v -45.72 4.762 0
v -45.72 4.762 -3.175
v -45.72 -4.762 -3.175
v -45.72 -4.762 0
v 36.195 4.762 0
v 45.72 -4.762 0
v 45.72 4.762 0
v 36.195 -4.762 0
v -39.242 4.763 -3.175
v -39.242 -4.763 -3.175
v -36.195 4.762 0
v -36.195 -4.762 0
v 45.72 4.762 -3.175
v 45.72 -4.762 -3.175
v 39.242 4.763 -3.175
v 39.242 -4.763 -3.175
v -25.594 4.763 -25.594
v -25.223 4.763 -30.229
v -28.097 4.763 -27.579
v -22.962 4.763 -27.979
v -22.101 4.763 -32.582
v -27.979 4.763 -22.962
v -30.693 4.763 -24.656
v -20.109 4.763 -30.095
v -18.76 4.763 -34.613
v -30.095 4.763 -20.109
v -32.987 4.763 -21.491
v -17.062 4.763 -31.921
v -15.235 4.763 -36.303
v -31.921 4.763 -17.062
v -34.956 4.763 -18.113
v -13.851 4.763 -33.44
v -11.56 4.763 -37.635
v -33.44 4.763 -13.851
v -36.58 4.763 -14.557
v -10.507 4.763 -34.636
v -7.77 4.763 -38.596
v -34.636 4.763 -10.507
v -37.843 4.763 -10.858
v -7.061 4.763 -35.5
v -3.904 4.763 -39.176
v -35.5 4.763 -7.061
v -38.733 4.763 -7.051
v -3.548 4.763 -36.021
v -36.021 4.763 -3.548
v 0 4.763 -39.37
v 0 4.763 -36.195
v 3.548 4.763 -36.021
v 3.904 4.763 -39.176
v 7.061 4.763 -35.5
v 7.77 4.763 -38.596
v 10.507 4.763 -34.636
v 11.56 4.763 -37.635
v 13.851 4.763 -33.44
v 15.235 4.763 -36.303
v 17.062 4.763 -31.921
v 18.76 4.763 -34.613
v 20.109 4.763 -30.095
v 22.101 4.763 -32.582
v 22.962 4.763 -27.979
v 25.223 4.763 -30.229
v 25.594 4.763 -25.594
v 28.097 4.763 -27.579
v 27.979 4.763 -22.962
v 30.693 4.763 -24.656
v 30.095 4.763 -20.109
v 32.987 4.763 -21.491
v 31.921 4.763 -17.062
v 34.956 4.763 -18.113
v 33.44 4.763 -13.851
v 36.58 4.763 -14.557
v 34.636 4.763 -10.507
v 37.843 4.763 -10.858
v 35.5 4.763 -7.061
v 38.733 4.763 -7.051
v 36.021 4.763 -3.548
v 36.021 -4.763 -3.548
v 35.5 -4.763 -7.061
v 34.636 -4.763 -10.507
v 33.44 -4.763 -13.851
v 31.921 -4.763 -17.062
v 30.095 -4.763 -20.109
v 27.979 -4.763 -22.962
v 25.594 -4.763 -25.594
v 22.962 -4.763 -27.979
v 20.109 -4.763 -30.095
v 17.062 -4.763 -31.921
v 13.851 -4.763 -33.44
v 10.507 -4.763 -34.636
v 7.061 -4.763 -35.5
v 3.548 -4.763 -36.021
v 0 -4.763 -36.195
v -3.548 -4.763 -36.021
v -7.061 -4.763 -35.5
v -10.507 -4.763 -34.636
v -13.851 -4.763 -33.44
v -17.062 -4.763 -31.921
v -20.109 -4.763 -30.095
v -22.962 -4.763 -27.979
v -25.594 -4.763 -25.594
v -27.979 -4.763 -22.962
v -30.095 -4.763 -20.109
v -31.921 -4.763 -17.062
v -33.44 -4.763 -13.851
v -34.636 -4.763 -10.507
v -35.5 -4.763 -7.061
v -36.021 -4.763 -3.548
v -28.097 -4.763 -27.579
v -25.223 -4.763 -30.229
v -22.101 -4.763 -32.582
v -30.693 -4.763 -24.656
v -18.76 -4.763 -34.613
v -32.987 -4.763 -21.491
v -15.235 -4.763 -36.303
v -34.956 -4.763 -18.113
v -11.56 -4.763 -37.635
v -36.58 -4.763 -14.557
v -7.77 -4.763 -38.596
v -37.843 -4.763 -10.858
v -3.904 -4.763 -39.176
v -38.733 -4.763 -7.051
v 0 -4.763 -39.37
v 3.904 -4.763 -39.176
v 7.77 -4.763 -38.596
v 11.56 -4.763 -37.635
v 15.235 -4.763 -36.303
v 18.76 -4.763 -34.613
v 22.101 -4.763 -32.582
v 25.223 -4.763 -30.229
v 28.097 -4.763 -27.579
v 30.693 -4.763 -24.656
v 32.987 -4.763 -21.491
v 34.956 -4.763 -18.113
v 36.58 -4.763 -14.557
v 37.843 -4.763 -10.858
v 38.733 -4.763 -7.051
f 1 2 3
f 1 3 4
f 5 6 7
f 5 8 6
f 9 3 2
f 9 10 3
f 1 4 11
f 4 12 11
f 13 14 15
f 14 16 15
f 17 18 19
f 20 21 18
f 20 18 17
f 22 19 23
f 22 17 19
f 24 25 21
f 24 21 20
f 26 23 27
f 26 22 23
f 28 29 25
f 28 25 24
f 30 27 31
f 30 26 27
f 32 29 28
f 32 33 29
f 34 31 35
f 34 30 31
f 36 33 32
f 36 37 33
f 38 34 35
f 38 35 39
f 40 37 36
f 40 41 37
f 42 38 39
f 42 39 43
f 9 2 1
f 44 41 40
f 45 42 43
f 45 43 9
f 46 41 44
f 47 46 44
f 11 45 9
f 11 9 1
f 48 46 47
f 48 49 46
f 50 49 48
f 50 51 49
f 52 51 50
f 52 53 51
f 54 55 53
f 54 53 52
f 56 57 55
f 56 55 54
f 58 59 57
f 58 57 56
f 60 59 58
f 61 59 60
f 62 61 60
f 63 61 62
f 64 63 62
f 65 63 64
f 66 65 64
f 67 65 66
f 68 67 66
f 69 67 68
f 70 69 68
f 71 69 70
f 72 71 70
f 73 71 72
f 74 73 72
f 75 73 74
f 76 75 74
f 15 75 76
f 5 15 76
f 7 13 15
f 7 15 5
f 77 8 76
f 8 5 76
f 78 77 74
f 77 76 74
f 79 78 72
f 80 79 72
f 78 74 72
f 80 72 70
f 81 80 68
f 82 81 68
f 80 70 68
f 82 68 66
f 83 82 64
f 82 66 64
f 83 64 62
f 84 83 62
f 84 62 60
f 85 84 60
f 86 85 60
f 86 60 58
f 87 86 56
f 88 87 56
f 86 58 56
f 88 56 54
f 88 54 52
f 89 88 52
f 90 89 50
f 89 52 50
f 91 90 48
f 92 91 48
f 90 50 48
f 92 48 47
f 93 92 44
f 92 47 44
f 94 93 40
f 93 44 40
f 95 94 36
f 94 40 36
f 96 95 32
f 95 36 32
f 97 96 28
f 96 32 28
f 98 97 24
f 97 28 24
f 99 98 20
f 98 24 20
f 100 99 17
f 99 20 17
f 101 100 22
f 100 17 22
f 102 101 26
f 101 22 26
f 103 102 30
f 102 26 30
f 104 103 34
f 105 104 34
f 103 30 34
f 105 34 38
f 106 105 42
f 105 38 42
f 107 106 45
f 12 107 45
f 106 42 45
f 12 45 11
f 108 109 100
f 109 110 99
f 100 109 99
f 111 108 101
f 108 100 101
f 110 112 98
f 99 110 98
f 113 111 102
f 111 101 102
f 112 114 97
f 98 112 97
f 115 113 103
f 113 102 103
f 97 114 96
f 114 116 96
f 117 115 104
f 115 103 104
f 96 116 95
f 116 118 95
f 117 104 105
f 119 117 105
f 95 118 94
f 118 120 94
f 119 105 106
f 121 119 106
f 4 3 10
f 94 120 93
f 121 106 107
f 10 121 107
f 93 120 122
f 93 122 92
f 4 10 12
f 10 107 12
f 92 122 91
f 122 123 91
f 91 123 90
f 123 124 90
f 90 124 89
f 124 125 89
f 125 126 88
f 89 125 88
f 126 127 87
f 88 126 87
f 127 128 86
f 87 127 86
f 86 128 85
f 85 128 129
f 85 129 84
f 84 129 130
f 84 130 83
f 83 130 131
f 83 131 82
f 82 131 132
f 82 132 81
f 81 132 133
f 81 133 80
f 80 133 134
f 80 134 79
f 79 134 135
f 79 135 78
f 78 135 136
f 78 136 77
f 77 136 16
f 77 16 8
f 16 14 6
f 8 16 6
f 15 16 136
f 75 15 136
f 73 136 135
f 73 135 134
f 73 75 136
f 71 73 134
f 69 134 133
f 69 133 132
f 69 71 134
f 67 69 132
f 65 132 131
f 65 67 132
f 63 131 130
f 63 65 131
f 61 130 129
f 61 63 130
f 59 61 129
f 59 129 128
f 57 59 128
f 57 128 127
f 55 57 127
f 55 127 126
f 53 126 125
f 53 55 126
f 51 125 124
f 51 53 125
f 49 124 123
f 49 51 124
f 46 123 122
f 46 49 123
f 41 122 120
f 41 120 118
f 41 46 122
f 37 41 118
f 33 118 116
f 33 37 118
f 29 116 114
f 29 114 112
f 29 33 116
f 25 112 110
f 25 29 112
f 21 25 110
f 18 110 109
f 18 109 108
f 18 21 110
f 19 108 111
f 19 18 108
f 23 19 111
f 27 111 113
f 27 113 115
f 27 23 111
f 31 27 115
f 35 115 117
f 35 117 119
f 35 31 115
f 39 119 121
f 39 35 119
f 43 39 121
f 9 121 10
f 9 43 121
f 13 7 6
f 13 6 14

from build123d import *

# Parameters (mm, degrees)
SKETCH1_W                = 3.175
SKETCH1_H                = 9.525
REVOLVE1_ANGLE           = 180
BOSS_EXTRUDE1_REACH      = 90.163
BOSS_EXTRUDE1_END_RADIUS = 39.37
SKETCH2_W                = 3.175
SKETCH2_H                = 9.525
SKETCH2_2_W              = 3.175
SKETCH2_2_H              = 9.525
BOSS_EXTRUDE2_DEPTH      = 6.35
BOSS_EXTRUDE3_REACH      = 95.878
BOSS_EXTRUDE3_END_RADIUS = 39.37
SKETCH4_W                = 3.175
SKETCH4_H                = 9.525
SKETCH4_2_W              = 3.175
SKETCH4_2_H              = 9.525
BOSS_EXTRUDE4_DEPTH      = 6.35


with BuildPart() as part:
    # Sketch1 → Revolve1 (revolve)
    with BuildSketch(Plane.XY):
        with Locations((37.7825, 0)):
            Rectangle(SKETCH1_W, SKETCH1_H)
    revolve(axis=Axis((0, -72.106361407, 0), (0, 1, 0)), revolution_arc=REVOLVE1_ANGLE)

    # Boss-Extrude1: up to this cylinder (the profile starts outside it)
    boss_extrude1_end = Plane(origin=(0, 0, 0), z_dir=(0, -1, 0)) * Cylinder(BOSS_EXTRUDE1_END_RADIUS, 260.066, mode=Mode.PRIVATE)
    # Sketch2 → Boss-Extrude1 (add, up to the surface)
    with BuildSketch(Plane(origin=(39.37, 0, 0), x_dir=(0, 0, -1), z_dir=(1, 0, 0)), mode=Mode.PRIVATE) as boss_extrude1_sk1:
        with Locations((1.5875, 0)):
            Rectangle(SKETCH2_W, SKETCH2_H)
    boss_extrude1_tool1 = extrude(boss_extrude1_sk1.sketch, amount=-BOSS_EXTRUDE1_REACH, mode=Mode.PRIVATE) - boss_extrude1_end
    add(boss_extrude1_tool1.solids().sort_by_distance((39.37, 0, -1.5875))[0])

    # Sketch2<2> → Boss-Extrude2 (add)
    with BuildSketch(Plane(origin=(39.37, 0, 0), x_dir=(0, 0, -1), z_dir=(1, 0, 0))):
        with Locations((1.5875, 0)):
            Rectangle(SKETCH2_2_W, SKETCH2_2_H)
    extrude(amount=BOSS_EXTRUDE2_DEPTH)

    # Boss-Extrude3: up to this cylinder (the profile starts outside it)
    boss_extrude3_end = Plane(origin=(0, 0, 0), z_dir=(0, -1, 0)) * Cylinder(BOSS_EXTRUDE3_END_RADIUS, 271.496, mode=Mode.PRIVATE)
    # Sketch4 → Boss-Extrude3 (add, up to the surface)
    with BuildSketch(Plane.ZY.offset(39.37), mode=Mode.PRIVATE) as boss_extrude3_sk1:
        with Locations((-1.5875, 0)):
            Rectangle(SKETCH4_W, SKETCH4_H)
    boss_extrude3_tool1 = extrude(boss_extrude3_sk1.sketch, amount=-BOSS_EXTRUDE3_REACH, mode=Mode.PRIVATE) - boss_extrude3_end
    add(boss_extrude3_tool1.solids().sort_by_distance((-39.37, 0, -1.5875))[0])

    # Sketch4<2> → Boss-Extrude4 (add)
    with BuildSketch(Plane.ZY.offset(39.37)):
        with Locations((-1.5875, 0)):
            Rectangle(SKETCH4_2_W, SKETCH4_2_H)
    extrude(amount=BOSS_EXTRUDE4_DEPTH)


solid = part.part
